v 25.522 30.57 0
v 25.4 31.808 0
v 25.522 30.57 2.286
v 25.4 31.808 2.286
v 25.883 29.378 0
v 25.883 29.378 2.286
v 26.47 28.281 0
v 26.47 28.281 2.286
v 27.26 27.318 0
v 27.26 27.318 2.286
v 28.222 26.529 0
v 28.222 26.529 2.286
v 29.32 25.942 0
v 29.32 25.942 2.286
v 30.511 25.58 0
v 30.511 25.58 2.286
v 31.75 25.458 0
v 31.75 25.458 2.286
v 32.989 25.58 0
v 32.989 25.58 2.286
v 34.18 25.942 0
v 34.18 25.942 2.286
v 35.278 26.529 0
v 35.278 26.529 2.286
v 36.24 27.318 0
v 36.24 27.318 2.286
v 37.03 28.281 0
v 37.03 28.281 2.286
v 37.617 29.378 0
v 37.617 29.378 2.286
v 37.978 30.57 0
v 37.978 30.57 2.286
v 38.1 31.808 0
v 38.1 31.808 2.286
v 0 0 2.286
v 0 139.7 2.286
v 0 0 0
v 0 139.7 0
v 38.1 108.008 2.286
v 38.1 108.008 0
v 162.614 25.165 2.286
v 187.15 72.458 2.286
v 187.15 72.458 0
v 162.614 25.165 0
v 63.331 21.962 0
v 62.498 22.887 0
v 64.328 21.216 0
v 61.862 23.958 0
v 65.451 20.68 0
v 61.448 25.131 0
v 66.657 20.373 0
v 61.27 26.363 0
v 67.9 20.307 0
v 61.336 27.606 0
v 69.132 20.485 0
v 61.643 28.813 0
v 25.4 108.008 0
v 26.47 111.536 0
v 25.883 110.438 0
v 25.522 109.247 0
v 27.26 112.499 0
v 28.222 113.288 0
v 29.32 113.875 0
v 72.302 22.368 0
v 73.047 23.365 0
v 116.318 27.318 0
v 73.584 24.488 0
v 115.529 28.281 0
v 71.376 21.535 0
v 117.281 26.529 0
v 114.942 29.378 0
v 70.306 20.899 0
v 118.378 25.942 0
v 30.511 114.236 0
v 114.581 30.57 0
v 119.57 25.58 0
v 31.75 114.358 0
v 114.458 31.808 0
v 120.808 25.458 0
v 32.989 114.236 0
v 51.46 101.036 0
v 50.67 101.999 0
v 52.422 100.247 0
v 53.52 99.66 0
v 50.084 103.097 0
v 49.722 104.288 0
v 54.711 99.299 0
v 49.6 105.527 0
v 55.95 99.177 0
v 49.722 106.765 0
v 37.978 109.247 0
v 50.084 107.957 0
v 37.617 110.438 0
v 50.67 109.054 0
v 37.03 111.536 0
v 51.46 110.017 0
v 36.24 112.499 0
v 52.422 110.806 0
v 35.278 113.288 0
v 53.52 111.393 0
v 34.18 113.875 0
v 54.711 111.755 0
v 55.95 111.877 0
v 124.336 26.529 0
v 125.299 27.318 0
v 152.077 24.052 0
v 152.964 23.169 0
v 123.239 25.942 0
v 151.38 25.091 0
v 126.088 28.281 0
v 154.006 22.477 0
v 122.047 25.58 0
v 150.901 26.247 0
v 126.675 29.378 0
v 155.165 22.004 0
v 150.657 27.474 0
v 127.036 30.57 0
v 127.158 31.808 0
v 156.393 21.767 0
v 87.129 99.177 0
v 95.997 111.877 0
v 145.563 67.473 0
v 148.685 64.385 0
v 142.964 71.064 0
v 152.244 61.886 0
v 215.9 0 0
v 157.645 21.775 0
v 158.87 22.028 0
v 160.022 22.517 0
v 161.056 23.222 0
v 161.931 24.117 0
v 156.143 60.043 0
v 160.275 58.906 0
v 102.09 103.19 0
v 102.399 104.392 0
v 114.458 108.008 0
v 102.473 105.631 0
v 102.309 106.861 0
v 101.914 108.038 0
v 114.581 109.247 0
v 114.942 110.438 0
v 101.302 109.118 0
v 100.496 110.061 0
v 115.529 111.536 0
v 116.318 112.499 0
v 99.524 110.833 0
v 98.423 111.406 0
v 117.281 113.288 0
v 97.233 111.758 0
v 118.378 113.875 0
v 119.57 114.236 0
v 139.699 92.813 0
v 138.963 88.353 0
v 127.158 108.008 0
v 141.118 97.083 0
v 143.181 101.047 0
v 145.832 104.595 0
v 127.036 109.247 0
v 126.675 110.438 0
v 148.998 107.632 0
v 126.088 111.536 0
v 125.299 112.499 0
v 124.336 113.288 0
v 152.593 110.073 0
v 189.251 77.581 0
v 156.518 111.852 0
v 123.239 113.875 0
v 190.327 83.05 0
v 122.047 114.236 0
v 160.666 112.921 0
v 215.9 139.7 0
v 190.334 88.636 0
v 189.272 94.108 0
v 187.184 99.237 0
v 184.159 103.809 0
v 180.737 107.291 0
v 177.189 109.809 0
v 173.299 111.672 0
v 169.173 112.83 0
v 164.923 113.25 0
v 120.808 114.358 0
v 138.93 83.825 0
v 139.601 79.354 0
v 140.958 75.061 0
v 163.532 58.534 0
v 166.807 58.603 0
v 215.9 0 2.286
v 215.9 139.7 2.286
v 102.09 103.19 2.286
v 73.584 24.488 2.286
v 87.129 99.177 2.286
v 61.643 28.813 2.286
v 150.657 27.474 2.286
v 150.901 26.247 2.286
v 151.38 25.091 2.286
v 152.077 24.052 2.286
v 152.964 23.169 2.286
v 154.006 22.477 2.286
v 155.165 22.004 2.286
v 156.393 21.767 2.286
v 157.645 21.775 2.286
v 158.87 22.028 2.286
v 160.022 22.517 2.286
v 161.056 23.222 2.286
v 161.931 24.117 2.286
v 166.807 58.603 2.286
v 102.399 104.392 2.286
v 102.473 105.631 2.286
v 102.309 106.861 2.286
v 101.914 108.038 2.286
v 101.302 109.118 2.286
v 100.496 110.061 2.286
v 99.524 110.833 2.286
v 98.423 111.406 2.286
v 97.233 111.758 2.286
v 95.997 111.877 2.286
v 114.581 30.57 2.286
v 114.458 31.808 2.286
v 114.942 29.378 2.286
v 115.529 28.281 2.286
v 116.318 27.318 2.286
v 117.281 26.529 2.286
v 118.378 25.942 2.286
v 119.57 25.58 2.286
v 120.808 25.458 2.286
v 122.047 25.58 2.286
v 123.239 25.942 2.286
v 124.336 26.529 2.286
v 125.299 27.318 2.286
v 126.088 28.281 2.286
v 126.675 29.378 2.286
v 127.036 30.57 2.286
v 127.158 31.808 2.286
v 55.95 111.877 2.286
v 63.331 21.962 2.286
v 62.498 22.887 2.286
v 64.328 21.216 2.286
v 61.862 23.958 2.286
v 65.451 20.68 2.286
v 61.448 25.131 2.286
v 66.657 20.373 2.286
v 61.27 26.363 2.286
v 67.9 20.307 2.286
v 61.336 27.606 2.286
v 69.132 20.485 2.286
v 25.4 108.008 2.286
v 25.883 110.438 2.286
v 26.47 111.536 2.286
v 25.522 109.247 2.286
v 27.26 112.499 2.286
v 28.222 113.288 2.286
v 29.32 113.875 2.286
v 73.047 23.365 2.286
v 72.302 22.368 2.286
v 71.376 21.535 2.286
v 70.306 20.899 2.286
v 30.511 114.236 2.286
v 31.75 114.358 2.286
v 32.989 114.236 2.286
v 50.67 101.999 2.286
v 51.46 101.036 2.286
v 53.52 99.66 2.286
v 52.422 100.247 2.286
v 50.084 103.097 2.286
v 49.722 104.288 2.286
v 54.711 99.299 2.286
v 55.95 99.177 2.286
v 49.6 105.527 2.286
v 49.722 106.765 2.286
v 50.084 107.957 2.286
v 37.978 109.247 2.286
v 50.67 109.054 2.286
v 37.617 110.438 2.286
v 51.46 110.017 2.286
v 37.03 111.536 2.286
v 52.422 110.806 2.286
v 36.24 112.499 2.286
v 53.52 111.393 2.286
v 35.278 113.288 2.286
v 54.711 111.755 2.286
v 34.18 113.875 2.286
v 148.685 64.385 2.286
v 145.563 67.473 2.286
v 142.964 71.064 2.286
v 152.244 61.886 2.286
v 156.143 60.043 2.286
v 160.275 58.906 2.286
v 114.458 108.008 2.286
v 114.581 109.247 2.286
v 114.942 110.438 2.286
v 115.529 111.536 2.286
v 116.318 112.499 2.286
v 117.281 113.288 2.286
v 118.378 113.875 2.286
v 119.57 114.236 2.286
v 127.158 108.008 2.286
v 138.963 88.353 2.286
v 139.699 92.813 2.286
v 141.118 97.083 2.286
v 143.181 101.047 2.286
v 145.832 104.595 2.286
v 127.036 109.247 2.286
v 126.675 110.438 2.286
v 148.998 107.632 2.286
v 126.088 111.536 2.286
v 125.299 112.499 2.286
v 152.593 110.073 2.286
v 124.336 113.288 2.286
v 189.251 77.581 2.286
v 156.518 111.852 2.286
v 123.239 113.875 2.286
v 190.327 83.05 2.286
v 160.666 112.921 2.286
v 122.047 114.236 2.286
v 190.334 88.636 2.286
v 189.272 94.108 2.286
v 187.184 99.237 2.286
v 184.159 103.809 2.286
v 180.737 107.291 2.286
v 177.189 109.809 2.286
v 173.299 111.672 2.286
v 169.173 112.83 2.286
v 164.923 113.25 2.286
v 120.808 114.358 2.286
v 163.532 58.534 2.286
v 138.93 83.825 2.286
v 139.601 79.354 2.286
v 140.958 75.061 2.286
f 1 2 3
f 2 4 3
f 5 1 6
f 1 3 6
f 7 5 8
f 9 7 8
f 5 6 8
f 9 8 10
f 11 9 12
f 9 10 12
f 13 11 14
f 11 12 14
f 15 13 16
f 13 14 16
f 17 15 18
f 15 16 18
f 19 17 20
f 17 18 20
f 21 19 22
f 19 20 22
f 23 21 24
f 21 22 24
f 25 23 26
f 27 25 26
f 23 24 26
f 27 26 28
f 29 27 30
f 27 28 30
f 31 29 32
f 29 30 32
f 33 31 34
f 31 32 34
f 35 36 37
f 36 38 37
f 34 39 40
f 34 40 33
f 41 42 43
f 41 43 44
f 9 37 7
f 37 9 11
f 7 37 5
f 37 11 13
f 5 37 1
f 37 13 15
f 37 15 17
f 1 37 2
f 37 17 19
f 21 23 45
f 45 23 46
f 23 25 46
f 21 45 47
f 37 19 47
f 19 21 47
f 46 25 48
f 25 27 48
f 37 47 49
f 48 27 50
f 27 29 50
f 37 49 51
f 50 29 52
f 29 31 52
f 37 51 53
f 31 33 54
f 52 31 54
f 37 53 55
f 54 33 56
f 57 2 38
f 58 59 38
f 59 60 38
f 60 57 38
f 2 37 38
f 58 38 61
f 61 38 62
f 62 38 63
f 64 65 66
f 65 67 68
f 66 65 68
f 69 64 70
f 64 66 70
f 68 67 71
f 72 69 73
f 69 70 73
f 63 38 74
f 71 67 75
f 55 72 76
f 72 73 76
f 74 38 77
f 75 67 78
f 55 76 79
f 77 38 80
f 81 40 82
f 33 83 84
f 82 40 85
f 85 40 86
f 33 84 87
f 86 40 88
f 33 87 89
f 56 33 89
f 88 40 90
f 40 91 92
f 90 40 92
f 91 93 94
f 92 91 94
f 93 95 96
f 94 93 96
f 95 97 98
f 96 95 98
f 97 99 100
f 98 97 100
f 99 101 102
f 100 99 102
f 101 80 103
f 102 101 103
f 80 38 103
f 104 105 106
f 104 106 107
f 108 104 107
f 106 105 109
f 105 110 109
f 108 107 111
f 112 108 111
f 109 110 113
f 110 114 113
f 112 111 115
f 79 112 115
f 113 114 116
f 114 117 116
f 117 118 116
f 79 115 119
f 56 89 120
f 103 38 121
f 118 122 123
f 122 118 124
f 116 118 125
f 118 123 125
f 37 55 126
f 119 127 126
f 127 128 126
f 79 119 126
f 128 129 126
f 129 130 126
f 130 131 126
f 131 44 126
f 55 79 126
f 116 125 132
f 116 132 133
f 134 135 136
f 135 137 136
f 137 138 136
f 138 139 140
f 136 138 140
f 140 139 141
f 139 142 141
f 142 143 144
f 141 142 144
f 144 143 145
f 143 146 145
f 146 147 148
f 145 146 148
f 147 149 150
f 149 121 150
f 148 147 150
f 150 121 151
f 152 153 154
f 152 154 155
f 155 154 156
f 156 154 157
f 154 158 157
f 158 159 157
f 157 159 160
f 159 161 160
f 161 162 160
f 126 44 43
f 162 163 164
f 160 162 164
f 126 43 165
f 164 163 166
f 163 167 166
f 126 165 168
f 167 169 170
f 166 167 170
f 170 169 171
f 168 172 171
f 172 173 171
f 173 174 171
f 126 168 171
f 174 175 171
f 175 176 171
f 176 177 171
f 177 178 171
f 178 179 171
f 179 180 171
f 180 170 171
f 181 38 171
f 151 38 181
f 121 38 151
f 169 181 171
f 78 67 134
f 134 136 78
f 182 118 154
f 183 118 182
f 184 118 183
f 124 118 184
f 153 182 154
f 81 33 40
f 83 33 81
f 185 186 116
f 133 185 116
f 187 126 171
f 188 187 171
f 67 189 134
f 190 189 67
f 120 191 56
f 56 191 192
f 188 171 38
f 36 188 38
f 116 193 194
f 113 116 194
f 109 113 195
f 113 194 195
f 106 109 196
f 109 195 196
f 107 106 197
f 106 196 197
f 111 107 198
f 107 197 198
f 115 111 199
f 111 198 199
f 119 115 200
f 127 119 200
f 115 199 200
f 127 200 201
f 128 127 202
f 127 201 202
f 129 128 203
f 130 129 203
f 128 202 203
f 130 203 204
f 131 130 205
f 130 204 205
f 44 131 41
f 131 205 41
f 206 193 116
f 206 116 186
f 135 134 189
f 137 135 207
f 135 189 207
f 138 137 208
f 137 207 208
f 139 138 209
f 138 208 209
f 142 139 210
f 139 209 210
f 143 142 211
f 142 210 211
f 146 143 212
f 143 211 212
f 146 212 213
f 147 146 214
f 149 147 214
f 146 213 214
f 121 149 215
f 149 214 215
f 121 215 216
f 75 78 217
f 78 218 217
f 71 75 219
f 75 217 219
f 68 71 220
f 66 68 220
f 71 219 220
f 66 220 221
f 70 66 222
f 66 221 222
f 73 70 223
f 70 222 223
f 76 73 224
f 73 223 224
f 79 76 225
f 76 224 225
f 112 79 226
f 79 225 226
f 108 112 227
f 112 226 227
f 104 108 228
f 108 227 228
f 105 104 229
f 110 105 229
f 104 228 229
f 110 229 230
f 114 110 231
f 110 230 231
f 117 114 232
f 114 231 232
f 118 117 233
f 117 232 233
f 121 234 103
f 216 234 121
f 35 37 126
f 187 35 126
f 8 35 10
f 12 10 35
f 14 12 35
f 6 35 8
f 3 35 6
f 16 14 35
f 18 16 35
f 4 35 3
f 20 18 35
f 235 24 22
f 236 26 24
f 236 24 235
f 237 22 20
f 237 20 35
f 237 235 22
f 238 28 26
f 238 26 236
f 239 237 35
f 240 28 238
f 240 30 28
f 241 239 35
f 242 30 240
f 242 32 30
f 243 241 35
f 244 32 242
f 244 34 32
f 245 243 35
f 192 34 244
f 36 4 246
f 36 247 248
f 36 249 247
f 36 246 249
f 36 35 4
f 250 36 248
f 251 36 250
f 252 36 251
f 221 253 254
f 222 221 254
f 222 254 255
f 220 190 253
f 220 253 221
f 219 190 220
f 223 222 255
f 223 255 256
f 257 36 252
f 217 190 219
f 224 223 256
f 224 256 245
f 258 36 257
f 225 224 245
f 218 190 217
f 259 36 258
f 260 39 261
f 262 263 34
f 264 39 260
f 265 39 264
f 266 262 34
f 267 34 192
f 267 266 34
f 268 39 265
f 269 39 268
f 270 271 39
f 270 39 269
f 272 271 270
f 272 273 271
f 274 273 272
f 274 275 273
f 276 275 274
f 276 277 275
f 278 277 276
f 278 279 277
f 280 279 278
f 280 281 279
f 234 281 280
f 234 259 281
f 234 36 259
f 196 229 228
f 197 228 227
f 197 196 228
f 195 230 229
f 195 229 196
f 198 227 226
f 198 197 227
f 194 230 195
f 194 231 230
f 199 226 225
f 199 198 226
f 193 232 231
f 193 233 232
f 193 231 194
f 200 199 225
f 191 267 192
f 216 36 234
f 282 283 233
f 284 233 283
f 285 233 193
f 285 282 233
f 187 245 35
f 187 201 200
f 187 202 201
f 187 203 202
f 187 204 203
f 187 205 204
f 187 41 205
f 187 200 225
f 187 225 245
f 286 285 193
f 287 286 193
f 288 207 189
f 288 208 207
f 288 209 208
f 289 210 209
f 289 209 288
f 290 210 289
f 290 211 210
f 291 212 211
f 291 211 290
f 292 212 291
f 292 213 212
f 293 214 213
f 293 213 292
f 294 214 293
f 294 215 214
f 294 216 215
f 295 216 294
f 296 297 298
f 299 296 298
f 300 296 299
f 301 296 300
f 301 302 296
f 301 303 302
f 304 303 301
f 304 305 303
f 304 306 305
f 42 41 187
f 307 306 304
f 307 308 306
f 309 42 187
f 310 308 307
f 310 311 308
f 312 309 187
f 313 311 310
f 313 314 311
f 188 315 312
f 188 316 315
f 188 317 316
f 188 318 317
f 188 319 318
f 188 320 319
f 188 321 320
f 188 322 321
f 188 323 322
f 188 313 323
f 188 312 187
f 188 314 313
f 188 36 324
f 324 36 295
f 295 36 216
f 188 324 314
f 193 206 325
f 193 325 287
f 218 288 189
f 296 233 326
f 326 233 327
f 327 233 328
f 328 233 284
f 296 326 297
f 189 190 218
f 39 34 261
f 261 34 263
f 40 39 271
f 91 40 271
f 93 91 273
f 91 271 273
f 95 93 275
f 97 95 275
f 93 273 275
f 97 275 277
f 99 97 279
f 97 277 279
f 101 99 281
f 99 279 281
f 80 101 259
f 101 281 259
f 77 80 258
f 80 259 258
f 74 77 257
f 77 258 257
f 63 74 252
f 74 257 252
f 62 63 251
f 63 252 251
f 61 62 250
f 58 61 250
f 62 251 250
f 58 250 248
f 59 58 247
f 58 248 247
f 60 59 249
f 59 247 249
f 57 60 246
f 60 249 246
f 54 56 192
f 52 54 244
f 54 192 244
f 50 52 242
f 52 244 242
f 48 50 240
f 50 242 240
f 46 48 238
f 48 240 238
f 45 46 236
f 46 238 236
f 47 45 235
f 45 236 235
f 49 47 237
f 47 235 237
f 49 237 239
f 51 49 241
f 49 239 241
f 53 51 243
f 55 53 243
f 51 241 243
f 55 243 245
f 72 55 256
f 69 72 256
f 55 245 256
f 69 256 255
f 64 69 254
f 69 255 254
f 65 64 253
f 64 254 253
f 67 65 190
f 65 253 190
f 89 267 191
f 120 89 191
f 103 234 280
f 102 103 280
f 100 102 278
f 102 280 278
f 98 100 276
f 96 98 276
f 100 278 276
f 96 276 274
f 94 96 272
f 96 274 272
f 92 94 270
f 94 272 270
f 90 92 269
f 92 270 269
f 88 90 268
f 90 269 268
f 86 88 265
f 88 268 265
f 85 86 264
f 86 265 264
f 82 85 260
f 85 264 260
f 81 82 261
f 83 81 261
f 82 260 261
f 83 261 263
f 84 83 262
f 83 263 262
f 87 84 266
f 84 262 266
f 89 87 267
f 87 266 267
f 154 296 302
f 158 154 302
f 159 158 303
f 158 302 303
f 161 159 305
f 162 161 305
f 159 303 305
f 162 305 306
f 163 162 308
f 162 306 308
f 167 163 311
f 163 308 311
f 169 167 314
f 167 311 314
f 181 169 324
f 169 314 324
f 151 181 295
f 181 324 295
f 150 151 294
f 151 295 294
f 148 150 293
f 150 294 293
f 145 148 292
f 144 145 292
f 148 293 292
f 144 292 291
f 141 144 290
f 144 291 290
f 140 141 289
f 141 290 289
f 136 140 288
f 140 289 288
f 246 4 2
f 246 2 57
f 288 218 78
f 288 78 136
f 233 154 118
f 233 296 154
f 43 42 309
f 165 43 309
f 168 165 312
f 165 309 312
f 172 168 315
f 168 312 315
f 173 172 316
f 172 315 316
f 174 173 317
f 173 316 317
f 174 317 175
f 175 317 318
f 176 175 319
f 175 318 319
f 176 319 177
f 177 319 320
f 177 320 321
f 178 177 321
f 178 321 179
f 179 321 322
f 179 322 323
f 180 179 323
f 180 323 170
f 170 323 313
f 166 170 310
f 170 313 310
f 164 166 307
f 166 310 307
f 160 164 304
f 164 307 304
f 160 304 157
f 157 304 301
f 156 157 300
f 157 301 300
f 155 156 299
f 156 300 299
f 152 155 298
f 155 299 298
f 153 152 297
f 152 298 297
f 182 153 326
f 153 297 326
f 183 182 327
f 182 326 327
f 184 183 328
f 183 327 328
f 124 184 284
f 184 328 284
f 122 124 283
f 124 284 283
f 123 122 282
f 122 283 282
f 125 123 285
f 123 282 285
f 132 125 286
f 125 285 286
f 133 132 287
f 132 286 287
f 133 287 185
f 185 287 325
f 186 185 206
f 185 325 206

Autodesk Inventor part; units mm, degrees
ref_plane "YZ Plane" through (0, 0, 0) normal (1, 0, 0) x (0, 1, 0)
ref_plane "XZ Plane" through (0, 0, 0) normal (0, 1, 0) x (-1, 0, 0)
ref_plane "XY Plane" through (0, 0, 0) normal (0, 0, 1) x (1, 0, 0)
sketch "Sketch1" plane through (0, 0, 0) normal (0, 0, 1) x (1, 0, 0)
  line L0 (0, 0) -> (215.9, 0)
  line L1 (215.9, 0) -> (215.9, 139.7)
  line L2 (215.9, 139.7) -> (0, 139.7)
  line L3 (0, 139.7) -> (0, 0)
  dimension "d0" = 215.9
  dimension "d1" = 139.7
extrude "Plate1" add sketch "Sketch1" along normal blind 2.286
sketch "Sketch2" plane through (0, 0, 2.286) normal (0, 0, 1) x (1, 0, 0)
  line L0 (0, 0) -> (0, 139.7) projected
  line L1 (215.9, 0) -> (0, 0) projected
  line L2 (215.9, 139.7) -> (215.9, 0) projected
  line L3 (0, 139.7) -> (215.9, 139.7) projected
sketch "Sketch3" plane through (0, 0, 2.286) normal (0, 0, 1) x (1, 0, 0)
  line L0 (0, 0) -> (0, 139.7)
  line L1 (215.9, 0) -> (0, 0)
  line L2 (215.9, 139.7) -> (215.9, 0)
  line L3 (0, 139.7) -> (215.9, 139.7)
  line L4 (38.1, 108.0084) -> (38.1, 31.8084)
  line L5 (25.4, 31.8084) -> (25.4, 108.0084)
  arc A0 (38.1, 108.0084) -> (25.4, 108.0084) centre (31.75, 108.0084) ccw
  arc A1 (25.4, 31.8084) -> (38.1, 31.8084) centre (31.75, 31.8084) ccw
  line L6 (127.1585, 108.0084) -> (127.1585, 31.8084)
  line L7 (114.4585, 31.8084) -> (114.4585, 108.0084)
  arc A2 (127.1585, 108.0084) -> (114.4585, 108.0084) centre (120.8085, 108.0084) ccw
  arc A3 (114.4585, 31.8084) -> (127.1585, 31.8084) centre (120.8085, 31.8084) ccw
  line L8 (55.9503, 111.8766) -> (95.9974, 111.8766)
  line L9 (102.0898, 103.1902) -> (73.5837, 24.4878)
  line L10 (55.9503, 99.1766) -> (87.1287, 99.1766)
  line L11 (87.1287, 99.1766) -> (61.6428, 28.8128)
  line L12 (73.5837, 24.4878) -> (73.5837, 24.4878)
  arc A4 (55.9503, 111.8766) -> (55.9503, 99.1766) centre (55.9503, 105.5266) ccw
  arc A5 (61.6428, 28.8128) -> (73.5837, 24.4878) centre (67.6132, 26.6503) ccw
  arc A6 (102.0898, 103.1902) -> (95.9974, 111.8766) centre (95.9974, 105.3969) ccw
  ellipse E0 centre (164.6613, 85.8797) end of major axis (164.6613, 113.2513) minor radius 25.8041 (187.1505, 72.4584) -> (166.8072, 58.6028) ccw
  line L13 (187.1505, 72.4584) -> (162.6138, 25.1653)
  arc A7 (150.6572, 27.4744) -> (162.6138, 25.1653) centre (156.9773, 28.0896) ccw
  line L14 (150.6572, 27.4744) -> (166.8072, 58.6028)
  dimension "d15" = 12.7
  dimension "d16" = 76.2
  dimension "d17" = 12.7
  dimension "d18" = 76.2
  dimension "d19" = 12.7
  dimension "d33" = 6.35
extrude "Cut2" cut sketch "Sketch3" against normal blind 2.286 contours L4 A1 L5 A0 | L6 A3 L7 A2 | L8 A6 L9 A5 L11 L10 A4 | L13 A7 L14 E0
sketch "Sketch4" plane through (0, 0, 2.286) normal (0, 0, 1) x (1, 0, 0)
  line L0 (87.1287, 99.1766) -> (55.9503, 99.1766) projected
  arc A0 (55.9503, 111.8766) -> (55.9503, 99.1766) centre (55.9503, 105.5266) ccw projected
  line L1 (55.9503, 111.8766) -> (95.9974, 111.8766) projected
  arc A1 (102.0898, 103.1902) -> (95.9974, 111.8766) centre (95.9974, 105.3969) ccw projected
  line L2 (102.0898, 103.1902) -> (73.5837, 24.4878) projected
  arc A2 (61.6428, 28.8128) -> (73.5837, 24.4878) centre (67.6132, 26.6503) ccw projected
  line L3 (61.6428, 28.8128) -> (87.1287, 99.1766) projected
  arc A3 (25.4, 31.8084) -> (38.1, 31.8084) centre (31.75, 31.8084) ccw projected
  line L4 (25.4, 31.8084) -> (25.4, 108.0084) projected
  arc A4 (38.1, 108.0084) -> (25.4, 108.0084) centre (31.75, 108.0084) ccw projected
  line L5 (38.1, 108.0084) -> (38.1, 31.8084) projected
  arc A5 (114.4585, 31.8084) -> (127.1585, 31.8084) centre (120.8085, 31.8084) ccw projected
  line L6 (114.4585, 31.8084) -> (114.4585, 108.0084) projected
  arc A6 (127.1585, 108.0084) -> (114.4585, 108.0084) centre (120.8085, 108.0084) ccw projected
  line L7 (127.1585, 108.0084) -> (127.1585, 31.8084) projected
  line L8 (150.6572, 27.4744) -> (166.8072, 58.6028) projected
  ellipse E0 centre (164.6613, 85.8797) end of major axis (164.6613, 113.2513) minor radius 25.8041 (187.1505, 72.4584) -> (166.8072, 58.6028) ccw projected
  line L9 (187.1505, 72.4584) -> (162.6138, 25.1653) projected
  arc A7 (150.6572, 27.4744) -> (162.6138, 25.1653) centre (156.9773, 28.0896) ccw projected
  line L10 (0, 0) -> (0, 139.7) projected
  line L11 (215.9, 0) -> (0, 0) projected
  line L12 (215.9, 139.7) -> (215.9, 0) projected
  line L13 (0, 139.7) -> (215.9, 139.7) projected
equation "\"d36\" = Thickness"
equation "\"BendRadius\" = Thickness"
equation "\"BendReliefWidth\" = Thickness"
equation "\"BendReliefDepth\" = 0.5 * Thickness"
equation "\"CornerReliefSize\" = 4 * Thickness"
equation "\"MinimumRemnant\" = 2 * Thickness"
equation "\"TransitionRadius\" = BendRadius"
equation "\"JacobiRadiusSize\" = BendRadius"
equation "\"GapSize\" = Thickness"
equation "\"d2\" = BendRadius"
equation "\"Thickness\" = 2.286"
properties part number "Number Plate"
